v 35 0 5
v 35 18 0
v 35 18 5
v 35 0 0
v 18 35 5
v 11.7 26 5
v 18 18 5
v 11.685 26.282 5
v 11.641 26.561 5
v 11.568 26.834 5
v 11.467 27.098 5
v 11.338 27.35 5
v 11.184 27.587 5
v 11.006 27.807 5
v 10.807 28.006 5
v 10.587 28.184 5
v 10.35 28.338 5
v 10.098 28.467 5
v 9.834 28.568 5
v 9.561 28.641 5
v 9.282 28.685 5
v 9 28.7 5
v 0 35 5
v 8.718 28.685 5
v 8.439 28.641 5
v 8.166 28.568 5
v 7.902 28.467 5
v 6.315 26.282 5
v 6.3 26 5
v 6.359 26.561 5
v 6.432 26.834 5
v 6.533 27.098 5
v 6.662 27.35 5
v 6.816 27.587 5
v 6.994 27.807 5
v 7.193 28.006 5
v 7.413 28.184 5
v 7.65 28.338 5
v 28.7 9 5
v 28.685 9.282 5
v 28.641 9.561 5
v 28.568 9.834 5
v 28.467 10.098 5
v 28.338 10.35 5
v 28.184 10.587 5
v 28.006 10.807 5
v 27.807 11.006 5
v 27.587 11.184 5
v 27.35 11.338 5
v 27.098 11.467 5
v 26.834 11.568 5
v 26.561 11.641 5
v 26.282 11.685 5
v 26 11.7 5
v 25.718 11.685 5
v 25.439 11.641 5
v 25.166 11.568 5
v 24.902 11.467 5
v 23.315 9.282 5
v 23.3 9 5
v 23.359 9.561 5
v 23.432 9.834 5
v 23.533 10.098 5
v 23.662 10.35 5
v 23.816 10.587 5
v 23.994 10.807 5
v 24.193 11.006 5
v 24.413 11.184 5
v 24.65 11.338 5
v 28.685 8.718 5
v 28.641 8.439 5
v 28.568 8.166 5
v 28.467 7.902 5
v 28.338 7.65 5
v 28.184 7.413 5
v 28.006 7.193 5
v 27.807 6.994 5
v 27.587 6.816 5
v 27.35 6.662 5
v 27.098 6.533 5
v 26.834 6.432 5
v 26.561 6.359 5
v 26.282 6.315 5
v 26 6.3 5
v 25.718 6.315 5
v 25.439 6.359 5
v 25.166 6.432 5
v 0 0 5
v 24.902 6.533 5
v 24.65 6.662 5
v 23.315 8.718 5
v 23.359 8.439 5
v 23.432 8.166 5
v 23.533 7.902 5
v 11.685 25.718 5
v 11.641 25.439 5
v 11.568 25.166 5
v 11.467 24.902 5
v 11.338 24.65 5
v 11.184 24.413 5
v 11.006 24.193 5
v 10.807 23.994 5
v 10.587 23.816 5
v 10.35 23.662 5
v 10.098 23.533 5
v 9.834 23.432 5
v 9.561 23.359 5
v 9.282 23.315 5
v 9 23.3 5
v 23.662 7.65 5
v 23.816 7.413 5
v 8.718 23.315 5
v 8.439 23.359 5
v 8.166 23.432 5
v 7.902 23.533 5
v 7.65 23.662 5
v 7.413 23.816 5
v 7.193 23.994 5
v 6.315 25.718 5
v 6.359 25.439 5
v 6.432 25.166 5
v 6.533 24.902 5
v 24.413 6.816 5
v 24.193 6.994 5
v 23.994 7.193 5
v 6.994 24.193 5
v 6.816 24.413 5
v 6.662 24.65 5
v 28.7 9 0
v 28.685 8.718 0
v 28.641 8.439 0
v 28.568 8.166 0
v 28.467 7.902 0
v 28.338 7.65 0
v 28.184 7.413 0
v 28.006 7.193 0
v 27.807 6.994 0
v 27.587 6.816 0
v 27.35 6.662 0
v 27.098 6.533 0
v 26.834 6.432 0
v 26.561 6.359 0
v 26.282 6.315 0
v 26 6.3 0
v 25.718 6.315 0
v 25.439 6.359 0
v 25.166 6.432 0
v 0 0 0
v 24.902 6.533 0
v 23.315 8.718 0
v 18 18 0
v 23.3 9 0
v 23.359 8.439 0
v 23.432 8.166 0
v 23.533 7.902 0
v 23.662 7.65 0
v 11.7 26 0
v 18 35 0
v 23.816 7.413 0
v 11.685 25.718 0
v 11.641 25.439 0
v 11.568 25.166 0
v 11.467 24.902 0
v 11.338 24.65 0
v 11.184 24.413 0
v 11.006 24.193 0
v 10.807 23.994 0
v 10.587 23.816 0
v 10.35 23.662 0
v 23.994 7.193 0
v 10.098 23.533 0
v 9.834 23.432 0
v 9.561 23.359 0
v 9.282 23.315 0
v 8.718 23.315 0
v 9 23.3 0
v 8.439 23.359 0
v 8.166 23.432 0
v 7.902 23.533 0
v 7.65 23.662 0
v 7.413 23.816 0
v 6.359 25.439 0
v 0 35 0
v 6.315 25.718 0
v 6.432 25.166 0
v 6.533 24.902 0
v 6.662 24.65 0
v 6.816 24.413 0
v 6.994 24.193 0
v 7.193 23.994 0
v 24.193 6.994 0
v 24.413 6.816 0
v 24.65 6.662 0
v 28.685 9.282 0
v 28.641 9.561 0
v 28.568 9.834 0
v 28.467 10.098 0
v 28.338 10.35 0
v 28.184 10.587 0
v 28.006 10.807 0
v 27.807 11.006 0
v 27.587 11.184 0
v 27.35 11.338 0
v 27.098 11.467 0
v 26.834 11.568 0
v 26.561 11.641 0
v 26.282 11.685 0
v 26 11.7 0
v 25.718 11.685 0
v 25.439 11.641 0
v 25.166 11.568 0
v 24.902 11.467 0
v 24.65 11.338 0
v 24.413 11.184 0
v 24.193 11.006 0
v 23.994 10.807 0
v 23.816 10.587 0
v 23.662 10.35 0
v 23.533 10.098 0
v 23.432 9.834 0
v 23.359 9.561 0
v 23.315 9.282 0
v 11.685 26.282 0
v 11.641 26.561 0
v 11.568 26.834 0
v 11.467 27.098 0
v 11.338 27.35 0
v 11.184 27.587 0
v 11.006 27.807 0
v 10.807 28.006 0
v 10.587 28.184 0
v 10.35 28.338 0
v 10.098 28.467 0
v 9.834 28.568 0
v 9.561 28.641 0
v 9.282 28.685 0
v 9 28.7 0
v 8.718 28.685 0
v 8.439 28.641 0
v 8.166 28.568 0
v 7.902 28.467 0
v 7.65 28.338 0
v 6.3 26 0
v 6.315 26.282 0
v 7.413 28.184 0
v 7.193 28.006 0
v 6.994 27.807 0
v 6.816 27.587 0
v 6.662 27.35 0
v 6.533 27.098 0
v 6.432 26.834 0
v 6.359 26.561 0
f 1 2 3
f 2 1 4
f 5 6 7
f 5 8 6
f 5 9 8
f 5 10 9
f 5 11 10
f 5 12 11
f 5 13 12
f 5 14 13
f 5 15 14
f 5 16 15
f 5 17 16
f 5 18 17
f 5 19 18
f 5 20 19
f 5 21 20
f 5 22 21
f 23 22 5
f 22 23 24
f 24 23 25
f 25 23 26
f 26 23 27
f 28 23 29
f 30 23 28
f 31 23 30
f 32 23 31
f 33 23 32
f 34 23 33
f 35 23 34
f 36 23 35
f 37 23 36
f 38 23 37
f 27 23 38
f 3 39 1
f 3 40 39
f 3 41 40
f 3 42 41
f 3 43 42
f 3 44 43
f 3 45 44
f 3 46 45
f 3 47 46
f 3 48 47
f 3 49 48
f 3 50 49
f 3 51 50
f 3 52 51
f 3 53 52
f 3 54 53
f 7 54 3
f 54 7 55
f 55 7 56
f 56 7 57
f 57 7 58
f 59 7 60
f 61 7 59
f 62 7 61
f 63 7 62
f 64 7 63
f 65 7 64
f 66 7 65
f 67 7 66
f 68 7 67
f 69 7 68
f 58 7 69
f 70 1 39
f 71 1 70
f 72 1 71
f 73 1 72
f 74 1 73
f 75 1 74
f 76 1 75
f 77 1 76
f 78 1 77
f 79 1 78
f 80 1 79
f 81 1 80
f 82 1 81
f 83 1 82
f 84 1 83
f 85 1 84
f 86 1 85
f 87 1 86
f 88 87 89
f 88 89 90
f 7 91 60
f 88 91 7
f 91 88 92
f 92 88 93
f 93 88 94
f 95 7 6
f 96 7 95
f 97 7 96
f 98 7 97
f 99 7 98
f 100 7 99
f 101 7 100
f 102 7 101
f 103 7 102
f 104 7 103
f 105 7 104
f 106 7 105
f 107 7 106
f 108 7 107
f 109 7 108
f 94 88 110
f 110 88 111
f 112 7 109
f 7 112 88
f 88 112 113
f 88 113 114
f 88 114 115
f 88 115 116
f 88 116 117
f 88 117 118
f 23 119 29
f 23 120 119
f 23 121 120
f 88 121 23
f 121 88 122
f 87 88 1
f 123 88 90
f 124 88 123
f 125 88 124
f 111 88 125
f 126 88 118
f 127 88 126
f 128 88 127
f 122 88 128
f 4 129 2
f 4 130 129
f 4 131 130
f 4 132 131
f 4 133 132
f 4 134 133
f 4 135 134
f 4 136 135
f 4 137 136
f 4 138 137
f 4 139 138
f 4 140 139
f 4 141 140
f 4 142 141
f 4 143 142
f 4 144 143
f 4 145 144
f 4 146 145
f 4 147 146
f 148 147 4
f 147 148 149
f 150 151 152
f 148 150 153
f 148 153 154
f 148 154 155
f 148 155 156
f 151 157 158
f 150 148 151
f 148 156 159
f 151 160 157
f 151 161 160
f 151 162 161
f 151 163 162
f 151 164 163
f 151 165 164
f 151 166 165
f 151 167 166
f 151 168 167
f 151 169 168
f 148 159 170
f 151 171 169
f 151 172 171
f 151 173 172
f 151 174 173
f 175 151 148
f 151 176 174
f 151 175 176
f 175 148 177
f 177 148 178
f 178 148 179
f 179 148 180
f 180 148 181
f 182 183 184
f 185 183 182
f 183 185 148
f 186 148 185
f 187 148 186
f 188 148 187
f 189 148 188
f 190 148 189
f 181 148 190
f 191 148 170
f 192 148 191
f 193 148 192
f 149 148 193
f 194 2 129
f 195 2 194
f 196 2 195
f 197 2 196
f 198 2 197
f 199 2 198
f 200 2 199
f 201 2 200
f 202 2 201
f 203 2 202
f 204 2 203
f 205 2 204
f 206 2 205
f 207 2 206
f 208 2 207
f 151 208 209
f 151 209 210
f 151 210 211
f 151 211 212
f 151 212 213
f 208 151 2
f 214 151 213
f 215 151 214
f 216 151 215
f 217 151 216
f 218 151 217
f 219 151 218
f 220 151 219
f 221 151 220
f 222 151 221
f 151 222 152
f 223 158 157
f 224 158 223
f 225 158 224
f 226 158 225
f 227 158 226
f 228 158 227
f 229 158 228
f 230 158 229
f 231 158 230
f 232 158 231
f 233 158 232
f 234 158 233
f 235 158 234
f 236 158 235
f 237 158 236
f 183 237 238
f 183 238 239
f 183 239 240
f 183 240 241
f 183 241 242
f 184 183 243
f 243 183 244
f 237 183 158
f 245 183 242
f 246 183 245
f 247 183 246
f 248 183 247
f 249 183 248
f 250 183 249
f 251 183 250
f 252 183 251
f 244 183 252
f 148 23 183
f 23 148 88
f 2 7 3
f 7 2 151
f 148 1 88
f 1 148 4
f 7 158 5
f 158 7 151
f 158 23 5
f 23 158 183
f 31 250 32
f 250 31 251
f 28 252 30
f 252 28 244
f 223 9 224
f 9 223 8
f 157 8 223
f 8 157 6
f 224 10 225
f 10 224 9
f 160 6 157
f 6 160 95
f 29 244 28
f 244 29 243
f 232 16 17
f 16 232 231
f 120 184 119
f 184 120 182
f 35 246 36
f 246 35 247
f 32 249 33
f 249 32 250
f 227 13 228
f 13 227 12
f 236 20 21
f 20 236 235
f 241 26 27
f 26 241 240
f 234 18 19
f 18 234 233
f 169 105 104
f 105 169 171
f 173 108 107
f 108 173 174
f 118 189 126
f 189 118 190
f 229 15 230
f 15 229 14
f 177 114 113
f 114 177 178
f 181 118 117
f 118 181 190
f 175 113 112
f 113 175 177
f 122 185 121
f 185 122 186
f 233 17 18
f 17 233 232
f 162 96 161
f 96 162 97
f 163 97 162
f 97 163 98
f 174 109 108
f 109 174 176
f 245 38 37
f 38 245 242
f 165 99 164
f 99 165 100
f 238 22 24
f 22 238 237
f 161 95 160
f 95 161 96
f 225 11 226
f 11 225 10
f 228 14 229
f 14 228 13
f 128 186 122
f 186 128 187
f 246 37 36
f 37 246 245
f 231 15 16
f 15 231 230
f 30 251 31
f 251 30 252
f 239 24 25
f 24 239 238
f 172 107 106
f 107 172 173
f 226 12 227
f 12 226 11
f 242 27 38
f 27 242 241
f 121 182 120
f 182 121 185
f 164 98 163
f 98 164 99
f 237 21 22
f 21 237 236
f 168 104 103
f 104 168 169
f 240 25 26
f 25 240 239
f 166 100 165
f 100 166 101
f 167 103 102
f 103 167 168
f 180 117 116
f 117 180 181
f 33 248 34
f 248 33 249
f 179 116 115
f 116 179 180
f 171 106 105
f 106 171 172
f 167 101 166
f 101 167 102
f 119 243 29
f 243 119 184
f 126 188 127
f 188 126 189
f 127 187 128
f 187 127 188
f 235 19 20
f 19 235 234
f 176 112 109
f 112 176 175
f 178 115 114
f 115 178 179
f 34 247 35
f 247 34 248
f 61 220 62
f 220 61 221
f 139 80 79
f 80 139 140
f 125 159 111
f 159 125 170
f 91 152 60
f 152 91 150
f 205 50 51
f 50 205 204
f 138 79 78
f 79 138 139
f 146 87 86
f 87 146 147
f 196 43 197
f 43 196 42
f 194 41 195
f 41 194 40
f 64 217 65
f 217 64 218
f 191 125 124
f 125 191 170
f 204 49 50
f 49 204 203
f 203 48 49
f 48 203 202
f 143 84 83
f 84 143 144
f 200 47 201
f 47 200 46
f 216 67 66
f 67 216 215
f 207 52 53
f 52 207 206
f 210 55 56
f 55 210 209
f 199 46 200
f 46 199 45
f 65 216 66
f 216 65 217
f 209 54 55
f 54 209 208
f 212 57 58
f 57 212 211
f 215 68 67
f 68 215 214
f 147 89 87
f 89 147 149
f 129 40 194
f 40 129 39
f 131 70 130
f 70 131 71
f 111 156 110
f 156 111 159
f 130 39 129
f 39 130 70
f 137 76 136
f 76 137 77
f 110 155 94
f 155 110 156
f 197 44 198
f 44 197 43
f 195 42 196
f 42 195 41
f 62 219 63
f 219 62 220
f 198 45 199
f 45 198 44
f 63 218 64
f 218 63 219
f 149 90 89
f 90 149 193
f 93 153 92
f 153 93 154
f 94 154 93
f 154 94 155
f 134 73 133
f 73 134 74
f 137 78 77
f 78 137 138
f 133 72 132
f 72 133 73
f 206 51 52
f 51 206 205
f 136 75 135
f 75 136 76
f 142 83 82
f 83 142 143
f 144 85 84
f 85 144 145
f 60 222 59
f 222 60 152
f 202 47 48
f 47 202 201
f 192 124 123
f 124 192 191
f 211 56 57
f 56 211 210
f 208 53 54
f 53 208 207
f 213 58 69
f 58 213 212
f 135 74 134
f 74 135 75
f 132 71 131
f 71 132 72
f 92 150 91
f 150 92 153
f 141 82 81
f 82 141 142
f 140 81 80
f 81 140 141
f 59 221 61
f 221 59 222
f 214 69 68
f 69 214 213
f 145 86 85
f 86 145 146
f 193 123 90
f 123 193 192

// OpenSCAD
// Flat 90-degree corner plate.
$fn = 60;
eps = 0.02;
arm = 35;
width = 18;
plate_t = 5;
difference() {
    union() { cube([arm, width, plate_t]); cube([width, arm, plate_t]); }
    for (p = [[width / 2, arm - width / 2], [arm - width / 2, width / 2]])
        translate([p[0], p[1], -eps]) cylinder(d = 5.4, h = plate_t + 2 * eps);
}
